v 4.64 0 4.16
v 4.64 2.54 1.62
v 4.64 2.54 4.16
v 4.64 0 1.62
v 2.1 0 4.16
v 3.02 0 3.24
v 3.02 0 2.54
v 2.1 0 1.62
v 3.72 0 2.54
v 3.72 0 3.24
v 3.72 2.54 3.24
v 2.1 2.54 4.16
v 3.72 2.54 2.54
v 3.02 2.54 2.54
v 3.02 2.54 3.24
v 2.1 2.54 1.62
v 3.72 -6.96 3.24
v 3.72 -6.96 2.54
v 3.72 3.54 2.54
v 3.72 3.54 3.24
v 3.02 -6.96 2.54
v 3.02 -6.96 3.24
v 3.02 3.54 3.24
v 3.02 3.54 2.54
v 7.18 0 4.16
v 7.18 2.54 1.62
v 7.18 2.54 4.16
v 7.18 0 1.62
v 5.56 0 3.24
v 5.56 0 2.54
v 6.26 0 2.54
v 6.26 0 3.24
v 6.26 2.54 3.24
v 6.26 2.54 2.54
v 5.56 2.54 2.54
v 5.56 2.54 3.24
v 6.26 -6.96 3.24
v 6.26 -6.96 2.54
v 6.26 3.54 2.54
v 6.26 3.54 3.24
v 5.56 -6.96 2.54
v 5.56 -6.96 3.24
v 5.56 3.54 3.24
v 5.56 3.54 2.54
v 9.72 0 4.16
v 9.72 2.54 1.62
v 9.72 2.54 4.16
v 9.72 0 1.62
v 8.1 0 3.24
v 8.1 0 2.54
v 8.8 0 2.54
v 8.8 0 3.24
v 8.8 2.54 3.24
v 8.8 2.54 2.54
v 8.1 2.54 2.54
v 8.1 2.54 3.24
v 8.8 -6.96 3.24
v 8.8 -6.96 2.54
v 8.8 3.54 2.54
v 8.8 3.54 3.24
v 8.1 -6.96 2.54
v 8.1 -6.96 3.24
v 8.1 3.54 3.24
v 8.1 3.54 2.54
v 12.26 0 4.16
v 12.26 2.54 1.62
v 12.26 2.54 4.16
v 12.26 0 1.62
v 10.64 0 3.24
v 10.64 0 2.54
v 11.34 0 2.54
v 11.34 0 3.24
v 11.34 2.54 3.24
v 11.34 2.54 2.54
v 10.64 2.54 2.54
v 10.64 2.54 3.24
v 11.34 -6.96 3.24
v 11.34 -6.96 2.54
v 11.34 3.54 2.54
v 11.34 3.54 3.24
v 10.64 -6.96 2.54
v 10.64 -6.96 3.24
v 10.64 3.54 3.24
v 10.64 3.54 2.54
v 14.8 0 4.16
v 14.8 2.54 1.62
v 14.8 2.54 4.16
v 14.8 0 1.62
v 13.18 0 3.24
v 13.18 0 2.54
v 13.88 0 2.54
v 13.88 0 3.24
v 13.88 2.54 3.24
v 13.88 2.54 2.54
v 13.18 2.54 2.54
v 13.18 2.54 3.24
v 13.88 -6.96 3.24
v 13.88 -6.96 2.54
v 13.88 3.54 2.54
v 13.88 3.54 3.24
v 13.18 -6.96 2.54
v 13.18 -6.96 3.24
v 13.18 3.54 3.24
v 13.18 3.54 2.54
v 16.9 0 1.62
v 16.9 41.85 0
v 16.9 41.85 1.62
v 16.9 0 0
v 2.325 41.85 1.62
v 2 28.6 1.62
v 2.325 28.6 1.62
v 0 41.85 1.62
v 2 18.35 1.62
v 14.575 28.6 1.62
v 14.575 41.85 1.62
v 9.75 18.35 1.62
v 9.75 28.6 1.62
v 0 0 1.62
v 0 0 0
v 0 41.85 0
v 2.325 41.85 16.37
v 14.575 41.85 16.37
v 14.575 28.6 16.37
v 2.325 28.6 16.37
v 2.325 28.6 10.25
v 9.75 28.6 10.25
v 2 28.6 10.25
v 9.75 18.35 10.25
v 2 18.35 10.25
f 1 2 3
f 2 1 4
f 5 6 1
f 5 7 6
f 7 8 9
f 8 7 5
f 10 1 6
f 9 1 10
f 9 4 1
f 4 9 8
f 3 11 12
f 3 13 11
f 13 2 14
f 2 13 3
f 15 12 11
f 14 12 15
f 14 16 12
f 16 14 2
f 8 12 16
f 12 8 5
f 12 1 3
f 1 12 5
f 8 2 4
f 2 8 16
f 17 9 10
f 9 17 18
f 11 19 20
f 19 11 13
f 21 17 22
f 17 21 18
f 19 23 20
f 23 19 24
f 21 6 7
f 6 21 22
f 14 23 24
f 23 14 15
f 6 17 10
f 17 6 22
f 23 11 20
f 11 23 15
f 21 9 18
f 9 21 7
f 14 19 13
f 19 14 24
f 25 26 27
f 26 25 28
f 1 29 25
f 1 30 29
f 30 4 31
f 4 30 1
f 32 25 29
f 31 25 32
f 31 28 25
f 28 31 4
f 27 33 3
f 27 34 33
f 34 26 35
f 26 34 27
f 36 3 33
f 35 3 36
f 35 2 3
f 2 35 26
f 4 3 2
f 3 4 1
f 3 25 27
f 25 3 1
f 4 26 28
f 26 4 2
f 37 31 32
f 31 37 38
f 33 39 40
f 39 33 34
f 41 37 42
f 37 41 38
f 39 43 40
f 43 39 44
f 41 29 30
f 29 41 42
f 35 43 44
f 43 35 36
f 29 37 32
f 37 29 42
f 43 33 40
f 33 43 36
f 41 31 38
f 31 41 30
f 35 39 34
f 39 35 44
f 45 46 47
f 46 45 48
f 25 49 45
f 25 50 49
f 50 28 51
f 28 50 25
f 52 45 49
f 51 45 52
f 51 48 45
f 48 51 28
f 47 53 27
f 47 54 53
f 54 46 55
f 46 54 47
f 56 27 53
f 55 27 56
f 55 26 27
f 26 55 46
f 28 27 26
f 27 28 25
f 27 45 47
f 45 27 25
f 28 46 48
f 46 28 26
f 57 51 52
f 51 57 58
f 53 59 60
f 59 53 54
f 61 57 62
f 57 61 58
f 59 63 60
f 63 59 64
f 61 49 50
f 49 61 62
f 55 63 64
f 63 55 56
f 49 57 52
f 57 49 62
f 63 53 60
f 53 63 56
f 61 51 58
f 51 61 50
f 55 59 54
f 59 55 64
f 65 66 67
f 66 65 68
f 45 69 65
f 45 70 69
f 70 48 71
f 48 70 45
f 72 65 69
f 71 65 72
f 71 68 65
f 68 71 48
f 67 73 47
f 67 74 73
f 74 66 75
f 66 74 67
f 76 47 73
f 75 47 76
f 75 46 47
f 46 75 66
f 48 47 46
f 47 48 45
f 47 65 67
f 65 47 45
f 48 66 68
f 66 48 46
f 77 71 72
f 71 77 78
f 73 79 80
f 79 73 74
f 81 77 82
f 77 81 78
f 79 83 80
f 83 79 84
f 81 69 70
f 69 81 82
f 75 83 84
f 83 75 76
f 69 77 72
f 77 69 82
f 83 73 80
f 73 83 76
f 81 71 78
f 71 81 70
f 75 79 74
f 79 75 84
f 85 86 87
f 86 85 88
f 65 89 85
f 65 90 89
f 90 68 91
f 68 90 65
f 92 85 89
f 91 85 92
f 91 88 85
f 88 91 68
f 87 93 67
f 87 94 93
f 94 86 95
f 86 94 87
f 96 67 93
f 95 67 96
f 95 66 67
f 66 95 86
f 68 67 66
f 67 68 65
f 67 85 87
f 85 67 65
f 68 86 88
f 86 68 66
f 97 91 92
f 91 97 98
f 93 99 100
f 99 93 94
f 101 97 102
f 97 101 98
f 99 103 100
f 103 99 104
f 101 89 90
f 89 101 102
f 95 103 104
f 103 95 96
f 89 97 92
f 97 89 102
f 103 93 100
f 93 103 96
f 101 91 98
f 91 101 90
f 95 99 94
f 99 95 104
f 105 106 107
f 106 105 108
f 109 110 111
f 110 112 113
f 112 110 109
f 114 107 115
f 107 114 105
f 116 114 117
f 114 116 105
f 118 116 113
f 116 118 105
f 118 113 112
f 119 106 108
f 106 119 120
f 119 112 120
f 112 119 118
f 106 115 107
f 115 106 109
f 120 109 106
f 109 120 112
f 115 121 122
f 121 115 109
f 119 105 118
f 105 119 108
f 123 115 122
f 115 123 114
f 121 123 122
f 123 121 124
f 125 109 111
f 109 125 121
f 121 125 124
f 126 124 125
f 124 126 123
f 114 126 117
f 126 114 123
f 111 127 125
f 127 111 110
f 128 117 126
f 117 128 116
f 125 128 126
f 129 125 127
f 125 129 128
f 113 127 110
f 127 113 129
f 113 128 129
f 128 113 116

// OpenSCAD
// file: pins.scad
pin_f_width = 2.54;
pin_f_thickness = 0.8;
pin_header_depth = 11.9;
pin_header_pin_length = 3.65;

pin_m_width = 0.7;
pin_m_length = 11.3;
pin_m_inset = (pin_f_width - pin_m_width) / 2;
pin_m_insulation_inset = 3.2;


function get_pin_header_width(pins, pad=false) = pad ? pin_f_width * pins + pin_f_width / 2 : pin_f_width * pins;
function get_pin_header_height(pad=false) = pad ? pin_f_width * 9 / 8 : pin_f_width;

module m_pin(pin_length=pin_m_length, insulation_inset=pin_m_insulation_inset) {
    cube([pin_f_width, pin_f_width, pin_f_width]);
    translate([pin_m_inset, pin_m_inset, -insulation_inset])
    cube([pin_m_width, pin_m_width, pin_length]);
}

module m_pins(pins, pin_length=pin_m_length, insulation_inset=pin_m_insulation_inset) {
    for (i = [0: pin_f_width: pin_f_width * (pins - 1)]) {
	translate([i, 0, 0])m_pin(pin_length, insulation_inset);
    }
}

module pin_header(pins, pad=false, pad_pins=0) {
    x_offset = pad ? - pin_f_width / 4 : 0;
    y_offset = pad ? - pin_f_width / 16 : 0;
    header_width = get_pin_header_width(pins, pad);
    header_height = get_pin_header_height(pad);
    header_depth = pad_pins ? pin_header_depth + pad_pins : pin_header_depth;
    translate([x_offset, y_offset, -pad_pins])
    cube([header_width, header_height, header_depth]);
}


//m_pins(5);
//pin_header(4);
// main file
include <pins.scad>

ws485_board_depth = 41.85;
ws485_board_width = 16.9;
ws485_board_height = 1.62;
ws485_board_neg_height = 1.4;

ws485_jack_width = 12.25;
ws485_jack_height = 14.75;
ws485_jack_depth = 13.25;
ws485_jack_peg_inset = 5;

ws485_jack_offset_x = (ws485_board_width - ws485_jack_width) / 2;
ws485_jack_offset_y = ws485_board_depth - ws485_jack_depth;

ws485_screw_term_depth = 10.25;
ws485_screw_term_width = 7.75;
ws485_screw_term_height = 10.25;
ws485_screw_term_insert_height = 4.5;
ws485_screw_term_top_width = 6;
ws485_screw_term_inset = 2;

ws485_pin_x = (ws485_board_width - 5 * pin_f_width) / 2;
ws485_pin_length = 10.5;
ws485_pin_insulation_inset = 1;

ws485_pin_inset = ws485_pin_insulation_inset + pin_f_width;
ws485_pin_overhang = ws485_pin_length - ws485_pin_inset;

module ws485_board() {
    cube([ws485_board_width, ws485_board_depth, ws485_board_height]);
}

module ws485_bottom_clearance() {
    translate([0, 0, -ws485_board_neg_height])
    cube([ws485_board_width, ws485_board_depth - ws485_jack_peg_inset, ws485_board_neg_height]);
}

module ws485_jack() {
	cube([ws485_jack_width, ws485_jack_depth, ws485_jack_height]);
}

module ws485_screwterm(cutout=false) {
    x_offset = cutout ? -10 : 0;
    x_inc = cutout ? 10 : 0;
    z_inc = cutout ? 15 : 0;
    seventh = ws485_screw_term_depth / 7;
    cube([ws485_screw_term_width, ws485_screw_term_depth, ws485_screw_term_height]);
    if (cutout) {
	translate([x_offset, seventh, ws485_board_height])
	cube([ws485_screw_term_width + x_inc, seventh * 2, ws485_screw_term_insert_height]);
	translate([x_offset, seventh * 4, ws485_board_height])
	cube([ws485_screw_term_width + x_inc, seventh * 2, ws485_screw_term_insert_height]);
	cube([ws485_screw_term_top_width, ws485_screw_term_depth, ws485_screw_term_height + z_inc]);
    }
}

module ws485(clearance=false) {
    ws485_board();
    translate([ws485_jack_offset_x, ws485_jack_offset_y, ws485_board_height]) ws485_jack();

    translate([ws485_screw_term_inset, ws485_board_depth - ws485_jack_depth - ws485_screw_term_depth, 0])
    ws485_screwterm(clearance);

    translate([ws485_pin_x, pin_f_width, ws485_board_height])
    rotate([90, 0 ,0])
    m_pins(5, pin_length=ws485_pin_length, insulation_inset=ws485_pin_insulation_inset);
    if (clearance) {
	ws485_bottom_clearance();
    }
}

ws485(0);
